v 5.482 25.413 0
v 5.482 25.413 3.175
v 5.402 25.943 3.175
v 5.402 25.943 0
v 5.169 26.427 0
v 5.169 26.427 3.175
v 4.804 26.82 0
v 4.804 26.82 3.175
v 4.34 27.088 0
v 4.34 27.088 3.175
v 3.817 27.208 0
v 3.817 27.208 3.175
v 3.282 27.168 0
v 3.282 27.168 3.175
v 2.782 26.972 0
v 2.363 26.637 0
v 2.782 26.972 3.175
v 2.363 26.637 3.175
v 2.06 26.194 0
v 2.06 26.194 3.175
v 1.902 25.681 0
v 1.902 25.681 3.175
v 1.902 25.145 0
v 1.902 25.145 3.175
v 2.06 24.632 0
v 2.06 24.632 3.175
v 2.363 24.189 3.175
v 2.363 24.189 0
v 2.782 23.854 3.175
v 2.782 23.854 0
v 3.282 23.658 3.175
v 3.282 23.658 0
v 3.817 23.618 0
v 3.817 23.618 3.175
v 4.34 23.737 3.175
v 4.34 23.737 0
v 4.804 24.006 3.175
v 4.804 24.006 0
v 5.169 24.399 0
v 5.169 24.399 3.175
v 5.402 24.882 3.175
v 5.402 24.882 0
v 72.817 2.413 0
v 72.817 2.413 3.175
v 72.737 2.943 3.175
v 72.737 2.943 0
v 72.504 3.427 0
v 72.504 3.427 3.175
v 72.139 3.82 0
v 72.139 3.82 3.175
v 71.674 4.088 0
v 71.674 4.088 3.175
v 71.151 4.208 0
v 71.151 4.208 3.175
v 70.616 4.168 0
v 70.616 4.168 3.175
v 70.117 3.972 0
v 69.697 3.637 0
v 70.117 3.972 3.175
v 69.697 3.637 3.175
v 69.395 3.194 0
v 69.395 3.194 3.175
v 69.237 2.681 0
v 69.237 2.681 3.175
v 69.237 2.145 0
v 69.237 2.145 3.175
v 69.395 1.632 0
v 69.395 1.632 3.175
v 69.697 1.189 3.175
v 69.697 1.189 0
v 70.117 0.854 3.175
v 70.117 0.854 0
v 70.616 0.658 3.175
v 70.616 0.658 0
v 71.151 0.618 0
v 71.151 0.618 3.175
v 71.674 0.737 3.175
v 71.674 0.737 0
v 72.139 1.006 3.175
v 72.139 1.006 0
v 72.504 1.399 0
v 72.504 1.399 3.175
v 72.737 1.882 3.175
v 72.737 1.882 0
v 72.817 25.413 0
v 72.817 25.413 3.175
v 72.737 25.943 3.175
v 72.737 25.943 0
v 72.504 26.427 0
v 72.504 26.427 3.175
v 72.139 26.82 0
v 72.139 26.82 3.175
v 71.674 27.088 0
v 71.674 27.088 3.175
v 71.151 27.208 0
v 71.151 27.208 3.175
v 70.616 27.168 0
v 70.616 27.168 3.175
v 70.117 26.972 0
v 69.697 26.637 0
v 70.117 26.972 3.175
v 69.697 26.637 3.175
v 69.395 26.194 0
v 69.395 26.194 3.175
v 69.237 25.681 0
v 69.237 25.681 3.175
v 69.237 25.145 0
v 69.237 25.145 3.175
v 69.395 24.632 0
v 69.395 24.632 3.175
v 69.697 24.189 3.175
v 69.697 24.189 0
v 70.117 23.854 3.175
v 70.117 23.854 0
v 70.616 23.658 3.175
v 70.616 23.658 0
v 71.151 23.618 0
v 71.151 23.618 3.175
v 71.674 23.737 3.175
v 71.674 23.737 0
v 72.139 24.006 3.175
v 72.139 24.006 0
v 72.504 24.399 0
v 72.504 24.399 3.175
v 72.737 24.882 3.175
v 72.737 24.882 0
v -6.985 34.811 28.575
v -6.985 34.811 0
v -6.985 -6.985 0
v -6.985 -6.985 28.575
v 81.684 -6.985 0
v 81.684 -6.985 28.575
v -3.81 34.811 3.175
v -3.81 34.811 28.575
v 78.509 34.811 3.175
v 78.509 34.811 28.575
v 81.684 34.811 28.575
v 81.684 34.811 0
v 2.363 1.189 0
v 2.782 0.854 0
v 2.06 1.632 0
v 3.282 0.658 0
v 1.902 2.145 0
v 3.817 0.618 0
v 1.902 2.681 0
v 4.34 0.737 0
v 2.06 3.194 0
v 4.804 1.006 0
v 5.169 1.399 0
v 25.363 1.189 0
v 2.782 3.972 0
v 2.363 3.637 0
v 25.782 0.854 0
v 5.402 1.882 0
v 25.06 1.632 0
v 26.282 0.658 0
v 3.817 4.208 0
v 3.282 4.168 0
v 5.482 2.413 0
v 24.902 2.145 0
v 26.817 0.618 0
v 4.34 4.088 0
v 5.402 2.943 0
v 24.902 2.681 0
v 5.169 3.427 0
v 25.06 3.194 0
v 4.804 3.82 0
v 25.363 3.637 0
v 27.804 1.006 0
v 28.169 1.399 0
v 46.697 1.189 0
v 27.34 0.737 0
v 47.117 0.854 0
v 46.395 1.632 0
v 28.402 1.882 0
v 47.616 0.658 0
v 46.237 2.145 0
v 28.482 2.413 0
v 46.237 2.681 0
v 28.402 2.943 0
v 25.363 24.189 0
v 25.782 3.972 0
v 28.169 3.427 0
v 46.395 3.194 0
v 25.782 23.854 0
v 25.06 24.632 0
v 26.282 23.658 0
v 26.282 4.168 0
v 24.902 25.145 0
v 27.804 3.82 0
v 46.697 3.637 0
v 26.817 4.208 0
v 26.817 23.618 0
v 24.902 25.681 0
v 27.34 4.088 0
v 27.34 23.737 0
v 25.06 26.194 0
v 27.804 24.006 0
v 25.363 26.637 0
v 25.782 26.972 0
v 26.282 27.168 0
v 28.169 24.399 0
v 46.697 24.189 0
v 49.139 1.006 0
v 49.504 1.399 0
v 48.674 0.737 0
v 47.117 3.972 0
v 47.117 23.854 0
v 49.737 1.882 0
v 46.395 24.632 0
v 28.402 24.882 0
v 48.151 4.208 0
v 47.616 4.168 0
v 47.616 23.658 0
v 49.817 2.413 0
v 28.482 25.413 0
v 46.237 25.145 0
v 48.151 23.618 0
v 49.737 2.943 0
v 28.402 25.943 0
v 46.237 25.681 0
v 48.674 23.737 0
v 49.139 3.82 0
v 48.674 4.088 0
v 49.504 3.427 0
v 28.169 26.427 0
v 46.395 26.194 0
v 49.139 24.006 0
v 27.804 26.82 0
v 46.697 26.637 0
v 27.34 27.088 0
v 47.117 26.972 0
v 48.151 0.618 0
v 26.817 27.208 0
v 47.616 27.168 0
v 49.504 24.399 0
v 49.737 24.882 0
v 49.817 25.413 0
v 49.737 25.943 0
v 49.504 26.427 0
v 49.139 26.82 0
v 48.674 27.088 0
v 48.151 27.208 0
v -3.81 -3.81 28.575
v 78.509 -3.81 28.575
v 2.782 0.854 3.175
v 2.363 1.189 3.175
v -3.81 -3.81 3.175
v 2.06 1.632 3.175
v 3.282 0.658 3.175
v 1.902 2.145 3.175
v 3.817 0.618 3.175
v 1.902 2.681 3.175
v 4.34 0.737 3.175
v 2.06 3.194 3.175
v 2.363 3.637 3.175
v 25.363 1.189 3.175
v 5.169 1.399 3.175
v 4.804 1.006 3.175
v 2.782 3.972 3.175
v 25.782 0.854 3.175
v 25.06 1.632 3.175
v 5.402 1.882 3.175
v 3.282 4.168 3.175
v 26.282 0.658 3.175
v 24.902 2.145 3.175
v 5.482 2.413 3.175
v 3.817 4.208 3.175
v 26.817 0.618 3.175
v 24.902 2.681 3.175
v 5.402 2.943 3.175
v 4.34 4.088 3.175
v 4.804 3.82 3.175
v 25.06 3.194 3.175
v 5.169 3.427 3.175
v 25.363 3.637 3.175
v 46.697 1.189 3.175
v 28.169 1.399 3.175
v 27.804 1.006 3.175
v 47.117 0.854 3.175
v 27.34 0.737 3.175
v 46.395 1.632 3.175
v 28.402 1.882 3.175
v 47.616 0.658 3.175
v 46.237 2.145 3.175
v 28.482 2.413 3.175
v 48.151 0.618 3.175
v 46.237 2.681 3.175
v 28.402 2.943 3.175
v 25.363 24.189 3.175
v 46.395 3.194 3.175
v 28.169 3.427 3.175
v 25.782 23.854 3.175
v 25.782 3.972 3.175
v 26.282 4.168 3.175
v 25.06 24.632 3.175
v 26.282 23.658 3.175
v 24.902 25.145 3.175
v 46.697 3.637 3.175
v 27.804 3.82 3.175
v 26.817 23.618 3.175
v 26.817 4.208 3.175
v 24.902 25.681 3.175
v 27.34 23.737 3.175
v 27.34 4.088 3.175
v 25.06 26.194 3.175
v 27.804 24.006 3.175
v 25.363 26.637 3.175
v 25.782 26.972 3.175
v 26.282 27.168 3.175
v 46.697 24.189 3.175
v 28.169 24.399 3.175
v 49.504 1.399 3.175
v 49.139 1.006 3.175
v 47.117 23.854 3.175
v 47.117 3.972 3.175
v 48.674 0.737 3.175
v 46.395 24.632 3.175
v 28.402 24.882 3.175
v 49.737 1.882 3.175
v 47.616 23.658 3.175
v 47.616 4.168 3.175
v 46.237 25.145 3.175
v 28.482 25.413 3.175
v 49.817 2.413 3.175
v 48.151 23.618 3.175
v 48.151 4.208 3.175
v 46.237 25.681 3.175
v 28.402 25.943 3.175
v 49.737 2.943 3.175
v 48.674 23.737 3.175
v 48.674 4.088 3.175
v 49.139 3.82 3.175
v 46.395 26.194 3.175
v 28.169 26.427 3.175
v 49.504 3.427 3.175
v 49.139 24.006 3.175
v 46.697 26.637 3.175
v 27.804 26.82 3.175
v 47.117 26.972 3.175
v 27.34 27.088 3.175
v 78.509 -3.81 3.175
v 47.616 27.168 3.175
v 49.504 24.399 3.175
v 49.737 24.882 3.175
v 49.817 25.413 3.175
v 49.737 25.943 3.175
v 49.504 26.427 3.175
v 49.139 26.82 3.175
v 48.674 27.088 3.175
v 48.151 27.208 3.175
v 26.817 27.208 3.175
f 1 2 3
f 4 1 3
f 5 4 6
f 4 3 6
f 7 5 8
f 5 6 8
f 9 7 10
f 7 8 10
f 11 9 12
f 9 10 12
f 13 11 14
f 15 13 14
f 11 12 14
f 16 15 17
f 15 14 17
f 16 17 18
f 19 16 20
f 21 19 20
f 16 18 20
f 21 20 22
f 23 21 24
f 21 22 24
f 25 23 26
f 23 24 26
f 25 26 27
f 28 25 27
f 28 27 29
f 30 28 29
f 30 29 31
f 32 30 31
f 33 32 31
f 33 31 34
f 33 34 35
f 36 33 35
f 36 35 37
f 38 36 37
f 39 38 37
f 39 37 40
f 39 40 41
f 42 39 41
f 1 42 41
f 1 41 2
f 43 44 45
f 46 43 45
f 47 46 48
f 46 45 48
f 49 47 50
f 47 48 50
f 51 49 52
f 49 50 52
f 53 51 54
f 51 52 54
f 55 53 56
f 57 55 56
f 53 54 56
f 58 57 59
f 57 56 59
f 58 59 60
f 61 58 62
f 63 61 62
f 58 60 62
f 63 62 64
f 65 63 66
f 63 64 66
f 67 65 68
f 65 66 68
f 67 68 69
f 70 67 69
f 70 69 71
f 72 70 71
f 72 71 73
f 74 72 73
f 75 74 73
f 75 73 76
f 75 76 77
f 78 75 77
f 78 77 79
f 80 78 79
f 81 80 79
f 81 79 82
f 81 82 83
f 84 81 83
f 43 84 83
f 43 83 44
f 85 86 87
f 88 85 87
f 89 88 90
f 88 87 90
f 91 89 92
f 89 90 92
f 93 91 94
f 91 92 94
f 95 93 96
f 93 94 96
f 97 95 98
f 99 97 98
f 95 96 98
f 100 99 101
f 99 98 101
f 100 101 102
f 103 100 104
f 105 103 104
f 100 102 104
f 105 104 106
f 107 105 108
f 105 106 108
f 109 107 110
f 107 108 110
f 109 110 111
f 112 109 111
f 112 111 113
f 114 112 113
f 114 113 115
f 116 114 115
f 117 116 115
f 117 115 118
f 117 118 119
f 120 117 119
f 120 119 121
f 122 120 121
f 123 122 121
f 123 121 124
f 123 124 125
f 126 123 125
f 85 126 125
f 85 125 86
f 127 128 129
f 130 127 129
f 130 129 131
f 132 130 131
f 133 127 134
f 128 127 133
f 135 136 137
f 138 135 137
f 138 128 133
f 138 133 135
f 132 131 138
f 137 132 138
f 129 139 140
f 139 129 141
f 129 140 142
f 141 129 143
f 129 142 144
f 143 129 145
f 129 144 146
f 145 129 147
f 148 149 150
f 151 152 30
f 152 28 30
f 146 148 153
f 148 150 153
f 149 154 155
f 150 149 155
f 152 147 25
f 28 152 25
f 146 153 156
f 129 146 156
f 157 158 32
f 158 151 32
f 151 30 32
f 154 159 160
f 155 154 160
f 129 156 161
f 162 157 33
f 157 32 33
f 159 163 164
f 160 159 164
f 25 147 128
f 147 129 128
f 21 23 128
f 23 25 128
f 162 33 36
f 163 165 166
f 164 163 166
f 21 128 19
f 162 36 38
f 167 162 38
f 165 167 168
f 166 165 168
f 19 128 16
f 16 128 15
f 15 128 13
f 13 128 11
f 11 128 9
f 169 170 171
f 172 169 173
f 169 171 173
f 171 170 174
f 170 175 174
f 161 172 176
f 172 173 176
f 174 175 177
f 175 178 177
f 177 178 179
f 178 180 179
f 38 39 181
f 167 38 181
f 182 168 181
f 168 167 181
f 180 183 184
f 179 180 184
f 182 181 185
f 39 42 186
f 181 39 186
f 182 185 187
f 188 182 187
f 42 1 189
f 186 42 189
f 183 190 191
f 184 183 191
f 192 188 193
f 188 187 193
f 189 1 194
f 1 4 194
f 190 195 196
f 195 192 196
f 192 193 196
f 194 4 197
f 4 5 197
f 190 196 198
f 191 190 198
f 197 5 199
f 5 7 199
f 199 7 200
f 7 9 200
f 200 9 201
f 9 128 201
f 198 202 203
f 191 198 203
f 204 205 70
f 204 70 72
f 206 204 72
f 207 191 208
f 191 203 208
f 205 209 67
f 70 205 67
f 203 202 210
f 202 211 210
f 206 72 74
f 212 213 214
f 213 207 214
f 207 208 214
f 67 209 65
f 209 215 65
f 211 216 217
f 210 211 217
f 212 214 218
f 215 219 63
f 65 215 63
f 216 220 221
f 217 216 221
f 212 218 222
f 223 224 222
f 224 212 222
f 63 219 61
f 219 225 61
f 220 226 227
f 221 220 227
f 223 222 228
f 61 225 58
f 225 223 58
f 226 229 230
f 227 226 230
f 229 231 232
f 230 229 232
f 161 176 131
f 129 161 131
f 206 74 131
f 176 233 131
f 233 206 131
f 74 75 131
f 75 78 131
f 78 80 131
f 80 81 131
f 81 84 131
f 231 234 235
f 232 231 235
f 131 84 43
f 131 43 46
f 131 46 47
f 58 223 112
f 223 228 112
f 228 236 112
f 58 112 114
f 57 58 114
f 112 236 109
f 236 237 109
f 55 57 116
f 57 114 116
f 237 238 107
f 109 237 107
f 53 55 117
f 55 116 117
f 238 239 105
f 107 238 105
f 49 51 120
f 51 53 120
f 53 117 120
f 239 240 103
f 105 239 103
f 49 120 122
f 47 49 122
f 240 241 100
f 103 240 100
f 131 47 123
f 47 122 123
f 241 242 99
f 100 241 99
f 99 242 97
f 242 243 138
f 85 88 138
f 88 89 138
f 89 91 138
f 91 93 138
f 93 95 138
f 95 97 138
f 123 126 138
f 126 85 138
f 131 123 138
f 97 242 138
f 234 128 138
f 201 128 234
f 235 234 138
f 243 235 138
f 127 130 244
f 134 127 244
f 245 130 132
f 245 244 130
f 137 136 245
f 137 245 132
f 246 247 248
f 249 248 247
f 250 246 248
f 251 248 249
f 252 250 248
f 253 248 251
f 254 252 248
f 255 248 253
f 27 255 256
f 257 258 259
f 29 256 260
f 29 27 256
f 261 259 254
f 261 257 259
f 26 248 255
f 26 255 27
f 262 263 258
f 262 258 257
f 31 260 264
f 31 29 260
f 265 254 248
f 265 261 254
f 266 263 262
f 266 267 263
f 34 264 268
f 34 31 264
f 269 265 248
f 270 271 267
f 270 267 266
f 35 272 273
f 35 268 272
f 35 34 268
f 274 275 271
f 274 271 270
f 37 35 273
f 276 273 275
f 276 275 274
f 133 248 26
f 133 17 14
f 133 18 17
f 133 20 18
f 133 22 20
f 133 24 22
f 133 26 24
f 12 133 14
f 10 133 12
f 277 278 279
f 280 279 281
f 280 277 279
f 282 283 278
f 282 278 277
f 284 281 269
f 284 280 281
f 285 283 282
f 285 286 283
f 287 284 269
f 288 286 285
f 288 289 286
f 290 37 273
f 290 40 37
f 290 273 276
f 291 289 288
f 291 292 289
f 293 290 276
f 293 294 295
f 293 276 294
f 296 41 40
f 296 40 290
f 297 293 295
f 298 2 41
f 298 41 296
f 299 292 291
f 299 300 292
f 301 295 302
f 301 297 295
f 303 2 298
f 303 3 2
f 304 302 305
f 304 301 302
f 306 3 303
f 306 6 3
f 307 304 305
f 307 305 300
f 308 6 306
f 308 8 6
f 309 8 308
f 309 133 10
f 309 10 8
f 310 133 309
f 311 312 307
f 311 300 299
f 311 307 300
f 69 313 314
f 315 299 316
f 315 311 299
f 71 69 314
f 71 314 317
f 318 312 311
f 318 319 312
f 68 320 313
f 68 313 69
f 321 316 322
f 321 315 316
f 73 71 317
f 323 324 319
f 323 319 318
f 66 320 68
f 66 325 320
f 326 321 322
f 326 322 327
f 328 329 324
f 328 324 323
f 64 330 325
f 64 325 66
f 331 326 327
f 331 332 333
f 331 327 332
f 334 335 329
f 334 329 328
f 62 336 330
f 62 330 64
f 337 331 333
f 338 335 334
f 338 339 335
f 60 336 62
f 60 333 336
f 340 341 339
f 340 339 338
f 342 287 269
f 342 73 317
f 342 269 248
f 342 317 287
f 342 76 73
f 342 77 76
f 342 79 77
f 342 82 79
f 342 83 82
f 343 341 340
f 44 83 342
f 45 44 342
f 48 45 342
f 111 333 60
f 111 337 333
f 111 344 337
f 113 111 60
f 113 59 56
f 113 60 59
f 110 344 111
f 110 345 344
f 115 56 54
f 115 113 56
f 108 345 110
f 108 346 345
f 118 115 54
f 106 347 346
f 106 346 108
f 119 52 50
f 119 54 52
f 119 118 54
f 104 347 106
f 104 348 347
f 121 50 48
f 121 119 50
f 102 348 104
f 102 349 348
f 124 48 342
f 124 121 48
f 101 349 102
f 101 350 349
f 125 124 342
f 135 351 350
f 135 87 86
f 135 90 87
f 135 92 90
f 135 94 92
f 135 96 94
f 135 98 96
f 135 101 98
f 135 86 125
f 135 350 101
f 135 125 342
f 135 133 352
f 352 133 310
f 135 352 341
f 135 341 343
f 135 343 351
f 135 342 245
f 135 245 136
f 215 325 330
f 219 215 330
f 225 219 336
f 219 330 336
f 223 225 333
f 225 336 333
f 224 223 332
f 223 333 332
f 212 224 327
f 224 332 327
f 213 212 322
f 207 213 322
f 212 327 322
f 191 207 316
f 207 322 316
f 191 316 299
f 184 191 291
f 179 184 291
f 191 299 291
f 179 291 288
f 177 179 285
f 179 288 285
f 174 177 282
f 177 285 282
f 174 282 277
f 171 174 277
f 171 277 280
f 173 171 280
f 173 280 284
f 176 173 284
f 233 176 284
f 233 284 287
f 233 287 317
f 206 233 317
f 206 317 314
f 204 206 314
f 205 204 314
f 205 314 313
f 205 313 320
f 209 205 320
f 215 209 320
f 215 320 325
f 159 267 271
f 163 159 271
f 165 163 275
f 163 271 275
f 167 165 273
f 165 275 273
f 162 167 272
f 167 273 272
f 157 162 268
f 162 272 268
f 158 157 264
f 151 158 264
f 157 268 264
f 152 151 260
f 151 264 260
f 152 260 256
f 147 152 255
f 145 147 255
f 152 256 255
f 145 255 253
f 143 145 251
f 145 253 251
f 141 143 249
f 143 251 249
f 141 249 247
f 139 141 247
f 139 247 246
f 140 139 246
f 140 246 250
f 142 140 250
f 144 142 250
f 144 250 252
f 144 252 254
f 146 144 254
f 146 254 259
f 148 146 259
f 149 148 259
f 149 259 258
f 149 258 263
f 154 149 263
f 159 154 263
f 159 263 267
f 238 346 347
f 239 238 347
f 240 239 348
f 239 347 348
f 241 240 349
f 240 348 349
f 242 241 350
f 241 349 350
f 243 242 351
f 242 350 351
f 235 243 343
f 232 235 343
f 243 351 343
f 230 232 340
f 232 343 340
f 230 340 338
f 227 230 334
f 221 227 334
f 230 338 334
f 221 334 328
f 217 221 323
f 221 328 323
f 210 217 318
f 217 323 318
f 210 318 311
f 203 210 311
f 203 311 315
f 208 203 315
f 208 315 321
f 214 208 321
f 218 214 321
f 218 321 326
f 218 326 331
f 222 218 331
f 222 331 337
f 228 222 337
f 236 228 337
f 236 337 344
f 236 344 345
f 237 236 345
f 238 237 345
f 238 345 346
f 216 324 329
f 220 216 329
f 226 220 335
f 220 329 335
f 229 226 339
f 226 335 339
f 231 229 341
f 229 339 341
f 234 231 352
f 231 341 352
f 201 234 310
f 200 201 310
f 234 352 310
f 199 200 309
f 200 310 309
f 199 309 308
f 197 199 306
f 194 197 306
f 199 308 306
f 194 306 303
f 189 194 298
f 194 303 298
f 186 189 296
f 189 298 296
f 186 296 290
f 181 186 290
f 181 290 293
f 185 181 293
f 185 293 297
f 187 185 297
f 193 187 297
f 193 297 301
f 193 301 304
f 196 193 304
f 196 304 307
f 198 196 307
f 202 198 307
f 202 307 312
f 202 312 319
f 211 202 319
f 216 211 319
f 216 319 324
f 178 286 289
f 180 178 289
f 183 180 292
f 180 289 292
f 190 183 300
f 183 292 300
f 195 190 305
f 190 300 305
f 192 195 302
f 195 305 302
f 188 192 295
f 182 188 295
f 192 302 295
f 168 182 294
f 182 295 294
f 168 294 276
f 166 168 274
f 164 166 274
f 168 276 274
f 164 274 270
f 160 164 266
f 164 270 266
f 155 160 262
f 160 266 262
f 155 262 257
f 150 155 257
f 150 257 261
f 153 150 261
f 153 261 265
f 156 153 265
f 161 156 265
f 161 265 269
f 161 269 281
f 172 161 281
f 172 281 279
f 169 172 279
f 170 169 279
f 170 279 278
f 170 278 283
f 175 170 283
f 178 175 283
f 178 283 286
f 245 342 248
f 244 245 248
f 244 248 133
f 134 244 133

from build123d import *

# Parameters (mm, degrees)
SKETCH2_W                = 82.31886
SKETCH2_H                = 38.6207
BOSS_EXTRUDE1_DEPTH      = 3.175
BOSS_EXTRUDE2_DEPTH      = 25.4
BOSS_EXTRUDE2_DEPTH_BACK = 3.175
SKETCH3_W                = 3.175
SKETCH3_H                = 38.6207
SKETCH4_R                = 0.561869351
SKETCH4_R_2              = 0.521667109
SKETCH4_R_3              = 0.606918095
SKETCH4_R_4              = 0.92346357
CUT_EXTRUDE1_DEPTH       = 94.276837661
M3_CLEARANCE_HOLE1_D     = 3.6


with BuildPart() as part:
    # Sketch2 → Boss-Extrude1 (new body)
    with BuildSketch(Plane.XY):
        with Locations((37.34943, 15.50035)):
            Rectangle(SKETCH2_W, SKETCH2_H)
    extrude(amount=BOSS_EXTRUDE1_DEPTH)

    # Sketch3 → Boss-Extrude2 (add, two sides: drawn at the far end of the back side and taken through both)
    with BuildSketch(Plane.XY.offset(3.175).offset(-BOSS_EXTRUDE2_DEPTH_BACK)):
        with Locations((-5.3975, 15.50035)):
            Rectangle(SKETCH3_W, SKETCH3_H)
        with Locations((80.09636, 15.50035)):
            Rectangle(SKETCH3_W, SKETCH3_H)
        Polygon((78.50886, -3.81), (-3.81, -3.81), (-6.985, -3.81), (-6.985, -6.985), (81.68386, -6.985), (81.68386, -3.81), align=None)
    extrude(amount=BOSS_EXTRUDE2_DEPTH + BOSS_EXTRUDE2_DEPTH_BACK)

    # Sketch4 → Cut-Extrude1 (cut, through all)
    with BuildSketch(Plane(origin=(0, 0, 0), x_dir=(-1, 0, 0), z_dir=(0, 0, -1))):
        with Locations((-26.682215, 25.41285)):
            Circle(SKETCH4_R)
        with Locations((-3.682215, 25.41285)):
            Circle(SKETCH4_R_2)
        with Locations((-26.682215, 2.41285)):
            Circle(SKETCH4_R_3)
        with Locations((-3.682215, 2.41285)):
            Circle(SKETCH4_R_4)
        with Locations((-48.016645, 2.41285)):
            Circle(SKETCH4_R_3)
        with Locations((-71.016645, 2.41285)):
            Circle(SKETCH4_R_4)
        with Locations((-71.016645, 25.41285)):
            Circle(SKETCH4_R_2)
        with Locations((-48.016645, 25.41285)):
            Circle(SKETCH4_R)
    extrude(amount=-CUT_EXTRUDE1_DEPTH, mode=Mode.SUBTRACT)

    # M3 Clearance Hole1 (through all)
    with Locations(Plane(origin=(0, 0, 0), x_dir=(-1, 0, 0), z_dir=(0, 0, -1))):
        with Locations((-71.016645, 25.41285), (-71.016645, 2.41285), (-3.682215, 2.41285), (-26.682215, 2.41285), (-48.016645, 2.41285), (-48.016645, 25.41285), (-26.682215, 25.41285), (-3.682215, 25.41285)):
            Hole(M3_CLEARANCE_HOLE1_D / 2)


solid = part.part
